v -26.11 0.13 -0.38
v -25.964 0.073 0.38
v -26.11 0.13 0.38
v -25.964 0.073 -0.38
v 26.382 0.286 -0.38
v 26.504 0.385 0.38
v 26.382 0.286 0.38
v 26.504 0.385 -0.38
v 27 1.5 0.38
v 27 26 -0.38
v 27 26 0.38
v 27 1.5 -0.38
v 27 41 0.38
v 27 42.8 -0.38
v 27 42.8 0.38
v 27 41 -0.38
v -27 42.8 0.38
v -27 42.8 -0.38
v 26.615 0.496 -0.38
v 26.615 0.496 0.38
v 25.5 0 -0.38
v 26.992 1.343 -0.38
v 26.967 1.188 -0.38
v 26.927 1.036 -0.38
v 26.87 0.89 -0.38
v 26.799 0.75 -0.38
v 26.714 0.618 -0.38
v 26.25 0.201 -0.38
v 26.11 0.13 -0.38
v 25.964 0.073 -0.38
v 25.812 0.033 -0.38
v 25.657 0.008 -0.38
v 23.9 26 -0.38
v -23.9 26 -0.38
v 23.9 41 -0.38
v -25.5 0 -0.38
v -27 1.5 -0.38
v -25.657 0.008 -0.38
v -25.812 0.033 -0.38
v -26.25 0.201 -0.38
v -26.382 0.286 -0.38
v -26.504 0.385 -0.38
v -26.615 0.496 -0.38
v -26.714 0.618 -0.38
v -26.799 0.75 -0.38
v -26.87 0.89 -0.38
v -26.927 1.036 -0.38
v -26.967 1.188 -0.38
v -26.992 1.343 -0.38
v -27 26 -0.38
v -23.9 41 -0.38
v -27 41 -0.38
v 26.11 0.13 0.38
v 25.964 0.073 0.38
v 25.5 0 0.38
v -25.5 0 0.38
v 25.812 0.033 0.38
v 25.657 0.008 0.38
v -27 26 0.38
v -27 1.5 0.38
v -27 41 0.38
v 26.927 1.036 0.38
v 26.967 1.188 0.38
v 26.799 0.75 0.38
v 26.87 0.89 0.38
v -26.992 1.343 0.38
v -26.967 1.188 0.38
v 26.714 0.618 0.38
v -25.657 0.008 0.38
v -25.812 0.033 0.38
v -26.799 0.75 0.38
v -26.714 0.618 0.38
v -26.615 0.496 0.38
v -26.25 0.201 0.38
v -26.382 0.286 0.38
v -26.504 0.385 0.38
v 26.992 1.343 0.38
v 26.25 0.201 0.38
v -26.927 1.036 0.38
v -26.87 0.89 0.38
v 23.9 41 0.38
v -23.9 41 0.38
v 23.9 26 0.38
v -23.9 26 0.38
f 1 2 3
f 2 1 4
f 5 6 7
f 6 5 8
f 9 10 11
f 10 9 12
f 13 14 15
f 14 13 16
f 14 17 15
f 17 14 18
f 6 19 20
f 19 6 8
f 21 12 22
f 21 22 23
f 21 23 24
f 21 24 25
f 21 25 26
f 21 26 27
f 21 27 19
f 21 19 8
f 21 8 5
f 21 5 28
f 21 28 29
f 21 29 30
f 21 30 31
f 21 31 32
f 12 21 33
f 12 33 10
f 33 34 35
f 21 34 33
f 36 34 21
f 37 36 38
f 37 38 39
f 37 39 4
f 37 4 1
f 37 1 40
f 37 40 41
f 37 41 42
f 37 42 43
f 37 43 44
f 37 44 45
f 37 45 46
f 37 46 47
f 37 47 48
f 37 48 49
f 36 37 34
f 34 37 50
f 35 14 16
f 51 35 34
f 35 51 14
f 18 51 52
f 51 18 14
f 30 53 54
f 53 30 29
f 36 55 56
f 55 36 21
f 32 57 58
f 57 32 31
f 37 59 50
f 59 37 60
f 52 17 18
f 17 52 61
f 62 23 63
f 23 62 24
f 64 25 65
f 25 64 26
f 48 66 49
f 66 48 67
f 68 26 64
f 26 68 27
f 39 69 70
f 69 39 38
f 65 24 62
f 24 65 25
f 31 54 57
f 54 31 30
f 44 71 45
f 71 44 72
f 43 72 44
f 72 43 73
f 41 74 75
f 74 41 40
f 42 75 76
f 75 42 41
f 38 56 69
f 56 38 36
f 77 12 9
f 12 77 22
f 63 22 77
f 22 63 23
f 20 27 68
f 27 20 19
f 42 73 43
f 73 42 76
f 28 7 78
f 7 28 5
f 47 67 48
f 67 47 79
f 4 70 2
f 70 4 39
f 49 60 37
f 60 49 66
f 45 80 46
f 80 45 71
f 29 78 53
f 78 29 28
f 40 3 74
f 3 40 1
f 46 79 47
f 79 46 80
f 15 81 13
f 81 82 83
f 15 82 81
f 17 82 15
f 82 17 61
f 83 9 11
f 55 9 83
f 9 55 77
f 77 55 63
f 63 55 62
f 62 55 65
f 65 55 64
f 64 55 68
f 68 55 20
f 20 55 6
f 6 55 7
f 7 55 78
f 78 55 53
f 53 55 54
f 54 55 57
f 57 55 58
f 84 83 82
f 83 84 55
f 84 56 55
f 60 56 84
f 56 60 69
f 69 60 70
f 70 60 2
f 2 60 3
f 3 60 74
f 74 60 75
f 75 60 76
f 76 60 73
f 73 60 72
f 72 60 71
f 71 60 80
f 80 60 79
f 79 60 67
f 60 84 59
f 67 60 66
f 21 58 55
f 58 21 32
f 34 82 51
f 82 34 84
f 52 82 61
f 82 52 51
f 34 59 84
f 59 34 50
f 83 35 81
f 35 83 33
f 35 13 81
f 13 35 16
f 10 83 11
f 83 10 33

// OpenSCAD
// Flap Display
// Maße:
//https://www.etsy.com/de/listing/979720975/blank-split-flap-display-flaps?ref=shop_home_active_6&crt=1&logging_key=9a650166e245f943e279f7e6ffdac373a0184f96%3A979720975&variation0=1859267286&variation1=4936227715


a = 54;
b = 42.8;

module Flap() {
    
    difference() {
        FlapForm();
        translate([-(a-3)/2,b-15/2-1.8,0])
        FlapGap();
        translate([+(a-3)/2,b-15/2-1.8,0])
        FlapGap();
    }
}


module FlapGap() {
    cube([3.2,15,2],center=true);
}

module FlapForm() {
    hull() {
        translate([-(a-3)/2,1.5,0])
        cylinder(d=3,h=0.76,center=true,$fn=60);
        translate([+(a-3)/2,1.5,0])
        cylinder(d=3,h=0.76,center=true,$fn=60);
        
        translate([-(a-3)/2,b-1.5,0])
        cube([3,3,0.76],center=true);
        
        translate([+(a-3)/2,b-1.5,0])
        cube([3,3,0.76],center=true);
    }
}


Flap();
